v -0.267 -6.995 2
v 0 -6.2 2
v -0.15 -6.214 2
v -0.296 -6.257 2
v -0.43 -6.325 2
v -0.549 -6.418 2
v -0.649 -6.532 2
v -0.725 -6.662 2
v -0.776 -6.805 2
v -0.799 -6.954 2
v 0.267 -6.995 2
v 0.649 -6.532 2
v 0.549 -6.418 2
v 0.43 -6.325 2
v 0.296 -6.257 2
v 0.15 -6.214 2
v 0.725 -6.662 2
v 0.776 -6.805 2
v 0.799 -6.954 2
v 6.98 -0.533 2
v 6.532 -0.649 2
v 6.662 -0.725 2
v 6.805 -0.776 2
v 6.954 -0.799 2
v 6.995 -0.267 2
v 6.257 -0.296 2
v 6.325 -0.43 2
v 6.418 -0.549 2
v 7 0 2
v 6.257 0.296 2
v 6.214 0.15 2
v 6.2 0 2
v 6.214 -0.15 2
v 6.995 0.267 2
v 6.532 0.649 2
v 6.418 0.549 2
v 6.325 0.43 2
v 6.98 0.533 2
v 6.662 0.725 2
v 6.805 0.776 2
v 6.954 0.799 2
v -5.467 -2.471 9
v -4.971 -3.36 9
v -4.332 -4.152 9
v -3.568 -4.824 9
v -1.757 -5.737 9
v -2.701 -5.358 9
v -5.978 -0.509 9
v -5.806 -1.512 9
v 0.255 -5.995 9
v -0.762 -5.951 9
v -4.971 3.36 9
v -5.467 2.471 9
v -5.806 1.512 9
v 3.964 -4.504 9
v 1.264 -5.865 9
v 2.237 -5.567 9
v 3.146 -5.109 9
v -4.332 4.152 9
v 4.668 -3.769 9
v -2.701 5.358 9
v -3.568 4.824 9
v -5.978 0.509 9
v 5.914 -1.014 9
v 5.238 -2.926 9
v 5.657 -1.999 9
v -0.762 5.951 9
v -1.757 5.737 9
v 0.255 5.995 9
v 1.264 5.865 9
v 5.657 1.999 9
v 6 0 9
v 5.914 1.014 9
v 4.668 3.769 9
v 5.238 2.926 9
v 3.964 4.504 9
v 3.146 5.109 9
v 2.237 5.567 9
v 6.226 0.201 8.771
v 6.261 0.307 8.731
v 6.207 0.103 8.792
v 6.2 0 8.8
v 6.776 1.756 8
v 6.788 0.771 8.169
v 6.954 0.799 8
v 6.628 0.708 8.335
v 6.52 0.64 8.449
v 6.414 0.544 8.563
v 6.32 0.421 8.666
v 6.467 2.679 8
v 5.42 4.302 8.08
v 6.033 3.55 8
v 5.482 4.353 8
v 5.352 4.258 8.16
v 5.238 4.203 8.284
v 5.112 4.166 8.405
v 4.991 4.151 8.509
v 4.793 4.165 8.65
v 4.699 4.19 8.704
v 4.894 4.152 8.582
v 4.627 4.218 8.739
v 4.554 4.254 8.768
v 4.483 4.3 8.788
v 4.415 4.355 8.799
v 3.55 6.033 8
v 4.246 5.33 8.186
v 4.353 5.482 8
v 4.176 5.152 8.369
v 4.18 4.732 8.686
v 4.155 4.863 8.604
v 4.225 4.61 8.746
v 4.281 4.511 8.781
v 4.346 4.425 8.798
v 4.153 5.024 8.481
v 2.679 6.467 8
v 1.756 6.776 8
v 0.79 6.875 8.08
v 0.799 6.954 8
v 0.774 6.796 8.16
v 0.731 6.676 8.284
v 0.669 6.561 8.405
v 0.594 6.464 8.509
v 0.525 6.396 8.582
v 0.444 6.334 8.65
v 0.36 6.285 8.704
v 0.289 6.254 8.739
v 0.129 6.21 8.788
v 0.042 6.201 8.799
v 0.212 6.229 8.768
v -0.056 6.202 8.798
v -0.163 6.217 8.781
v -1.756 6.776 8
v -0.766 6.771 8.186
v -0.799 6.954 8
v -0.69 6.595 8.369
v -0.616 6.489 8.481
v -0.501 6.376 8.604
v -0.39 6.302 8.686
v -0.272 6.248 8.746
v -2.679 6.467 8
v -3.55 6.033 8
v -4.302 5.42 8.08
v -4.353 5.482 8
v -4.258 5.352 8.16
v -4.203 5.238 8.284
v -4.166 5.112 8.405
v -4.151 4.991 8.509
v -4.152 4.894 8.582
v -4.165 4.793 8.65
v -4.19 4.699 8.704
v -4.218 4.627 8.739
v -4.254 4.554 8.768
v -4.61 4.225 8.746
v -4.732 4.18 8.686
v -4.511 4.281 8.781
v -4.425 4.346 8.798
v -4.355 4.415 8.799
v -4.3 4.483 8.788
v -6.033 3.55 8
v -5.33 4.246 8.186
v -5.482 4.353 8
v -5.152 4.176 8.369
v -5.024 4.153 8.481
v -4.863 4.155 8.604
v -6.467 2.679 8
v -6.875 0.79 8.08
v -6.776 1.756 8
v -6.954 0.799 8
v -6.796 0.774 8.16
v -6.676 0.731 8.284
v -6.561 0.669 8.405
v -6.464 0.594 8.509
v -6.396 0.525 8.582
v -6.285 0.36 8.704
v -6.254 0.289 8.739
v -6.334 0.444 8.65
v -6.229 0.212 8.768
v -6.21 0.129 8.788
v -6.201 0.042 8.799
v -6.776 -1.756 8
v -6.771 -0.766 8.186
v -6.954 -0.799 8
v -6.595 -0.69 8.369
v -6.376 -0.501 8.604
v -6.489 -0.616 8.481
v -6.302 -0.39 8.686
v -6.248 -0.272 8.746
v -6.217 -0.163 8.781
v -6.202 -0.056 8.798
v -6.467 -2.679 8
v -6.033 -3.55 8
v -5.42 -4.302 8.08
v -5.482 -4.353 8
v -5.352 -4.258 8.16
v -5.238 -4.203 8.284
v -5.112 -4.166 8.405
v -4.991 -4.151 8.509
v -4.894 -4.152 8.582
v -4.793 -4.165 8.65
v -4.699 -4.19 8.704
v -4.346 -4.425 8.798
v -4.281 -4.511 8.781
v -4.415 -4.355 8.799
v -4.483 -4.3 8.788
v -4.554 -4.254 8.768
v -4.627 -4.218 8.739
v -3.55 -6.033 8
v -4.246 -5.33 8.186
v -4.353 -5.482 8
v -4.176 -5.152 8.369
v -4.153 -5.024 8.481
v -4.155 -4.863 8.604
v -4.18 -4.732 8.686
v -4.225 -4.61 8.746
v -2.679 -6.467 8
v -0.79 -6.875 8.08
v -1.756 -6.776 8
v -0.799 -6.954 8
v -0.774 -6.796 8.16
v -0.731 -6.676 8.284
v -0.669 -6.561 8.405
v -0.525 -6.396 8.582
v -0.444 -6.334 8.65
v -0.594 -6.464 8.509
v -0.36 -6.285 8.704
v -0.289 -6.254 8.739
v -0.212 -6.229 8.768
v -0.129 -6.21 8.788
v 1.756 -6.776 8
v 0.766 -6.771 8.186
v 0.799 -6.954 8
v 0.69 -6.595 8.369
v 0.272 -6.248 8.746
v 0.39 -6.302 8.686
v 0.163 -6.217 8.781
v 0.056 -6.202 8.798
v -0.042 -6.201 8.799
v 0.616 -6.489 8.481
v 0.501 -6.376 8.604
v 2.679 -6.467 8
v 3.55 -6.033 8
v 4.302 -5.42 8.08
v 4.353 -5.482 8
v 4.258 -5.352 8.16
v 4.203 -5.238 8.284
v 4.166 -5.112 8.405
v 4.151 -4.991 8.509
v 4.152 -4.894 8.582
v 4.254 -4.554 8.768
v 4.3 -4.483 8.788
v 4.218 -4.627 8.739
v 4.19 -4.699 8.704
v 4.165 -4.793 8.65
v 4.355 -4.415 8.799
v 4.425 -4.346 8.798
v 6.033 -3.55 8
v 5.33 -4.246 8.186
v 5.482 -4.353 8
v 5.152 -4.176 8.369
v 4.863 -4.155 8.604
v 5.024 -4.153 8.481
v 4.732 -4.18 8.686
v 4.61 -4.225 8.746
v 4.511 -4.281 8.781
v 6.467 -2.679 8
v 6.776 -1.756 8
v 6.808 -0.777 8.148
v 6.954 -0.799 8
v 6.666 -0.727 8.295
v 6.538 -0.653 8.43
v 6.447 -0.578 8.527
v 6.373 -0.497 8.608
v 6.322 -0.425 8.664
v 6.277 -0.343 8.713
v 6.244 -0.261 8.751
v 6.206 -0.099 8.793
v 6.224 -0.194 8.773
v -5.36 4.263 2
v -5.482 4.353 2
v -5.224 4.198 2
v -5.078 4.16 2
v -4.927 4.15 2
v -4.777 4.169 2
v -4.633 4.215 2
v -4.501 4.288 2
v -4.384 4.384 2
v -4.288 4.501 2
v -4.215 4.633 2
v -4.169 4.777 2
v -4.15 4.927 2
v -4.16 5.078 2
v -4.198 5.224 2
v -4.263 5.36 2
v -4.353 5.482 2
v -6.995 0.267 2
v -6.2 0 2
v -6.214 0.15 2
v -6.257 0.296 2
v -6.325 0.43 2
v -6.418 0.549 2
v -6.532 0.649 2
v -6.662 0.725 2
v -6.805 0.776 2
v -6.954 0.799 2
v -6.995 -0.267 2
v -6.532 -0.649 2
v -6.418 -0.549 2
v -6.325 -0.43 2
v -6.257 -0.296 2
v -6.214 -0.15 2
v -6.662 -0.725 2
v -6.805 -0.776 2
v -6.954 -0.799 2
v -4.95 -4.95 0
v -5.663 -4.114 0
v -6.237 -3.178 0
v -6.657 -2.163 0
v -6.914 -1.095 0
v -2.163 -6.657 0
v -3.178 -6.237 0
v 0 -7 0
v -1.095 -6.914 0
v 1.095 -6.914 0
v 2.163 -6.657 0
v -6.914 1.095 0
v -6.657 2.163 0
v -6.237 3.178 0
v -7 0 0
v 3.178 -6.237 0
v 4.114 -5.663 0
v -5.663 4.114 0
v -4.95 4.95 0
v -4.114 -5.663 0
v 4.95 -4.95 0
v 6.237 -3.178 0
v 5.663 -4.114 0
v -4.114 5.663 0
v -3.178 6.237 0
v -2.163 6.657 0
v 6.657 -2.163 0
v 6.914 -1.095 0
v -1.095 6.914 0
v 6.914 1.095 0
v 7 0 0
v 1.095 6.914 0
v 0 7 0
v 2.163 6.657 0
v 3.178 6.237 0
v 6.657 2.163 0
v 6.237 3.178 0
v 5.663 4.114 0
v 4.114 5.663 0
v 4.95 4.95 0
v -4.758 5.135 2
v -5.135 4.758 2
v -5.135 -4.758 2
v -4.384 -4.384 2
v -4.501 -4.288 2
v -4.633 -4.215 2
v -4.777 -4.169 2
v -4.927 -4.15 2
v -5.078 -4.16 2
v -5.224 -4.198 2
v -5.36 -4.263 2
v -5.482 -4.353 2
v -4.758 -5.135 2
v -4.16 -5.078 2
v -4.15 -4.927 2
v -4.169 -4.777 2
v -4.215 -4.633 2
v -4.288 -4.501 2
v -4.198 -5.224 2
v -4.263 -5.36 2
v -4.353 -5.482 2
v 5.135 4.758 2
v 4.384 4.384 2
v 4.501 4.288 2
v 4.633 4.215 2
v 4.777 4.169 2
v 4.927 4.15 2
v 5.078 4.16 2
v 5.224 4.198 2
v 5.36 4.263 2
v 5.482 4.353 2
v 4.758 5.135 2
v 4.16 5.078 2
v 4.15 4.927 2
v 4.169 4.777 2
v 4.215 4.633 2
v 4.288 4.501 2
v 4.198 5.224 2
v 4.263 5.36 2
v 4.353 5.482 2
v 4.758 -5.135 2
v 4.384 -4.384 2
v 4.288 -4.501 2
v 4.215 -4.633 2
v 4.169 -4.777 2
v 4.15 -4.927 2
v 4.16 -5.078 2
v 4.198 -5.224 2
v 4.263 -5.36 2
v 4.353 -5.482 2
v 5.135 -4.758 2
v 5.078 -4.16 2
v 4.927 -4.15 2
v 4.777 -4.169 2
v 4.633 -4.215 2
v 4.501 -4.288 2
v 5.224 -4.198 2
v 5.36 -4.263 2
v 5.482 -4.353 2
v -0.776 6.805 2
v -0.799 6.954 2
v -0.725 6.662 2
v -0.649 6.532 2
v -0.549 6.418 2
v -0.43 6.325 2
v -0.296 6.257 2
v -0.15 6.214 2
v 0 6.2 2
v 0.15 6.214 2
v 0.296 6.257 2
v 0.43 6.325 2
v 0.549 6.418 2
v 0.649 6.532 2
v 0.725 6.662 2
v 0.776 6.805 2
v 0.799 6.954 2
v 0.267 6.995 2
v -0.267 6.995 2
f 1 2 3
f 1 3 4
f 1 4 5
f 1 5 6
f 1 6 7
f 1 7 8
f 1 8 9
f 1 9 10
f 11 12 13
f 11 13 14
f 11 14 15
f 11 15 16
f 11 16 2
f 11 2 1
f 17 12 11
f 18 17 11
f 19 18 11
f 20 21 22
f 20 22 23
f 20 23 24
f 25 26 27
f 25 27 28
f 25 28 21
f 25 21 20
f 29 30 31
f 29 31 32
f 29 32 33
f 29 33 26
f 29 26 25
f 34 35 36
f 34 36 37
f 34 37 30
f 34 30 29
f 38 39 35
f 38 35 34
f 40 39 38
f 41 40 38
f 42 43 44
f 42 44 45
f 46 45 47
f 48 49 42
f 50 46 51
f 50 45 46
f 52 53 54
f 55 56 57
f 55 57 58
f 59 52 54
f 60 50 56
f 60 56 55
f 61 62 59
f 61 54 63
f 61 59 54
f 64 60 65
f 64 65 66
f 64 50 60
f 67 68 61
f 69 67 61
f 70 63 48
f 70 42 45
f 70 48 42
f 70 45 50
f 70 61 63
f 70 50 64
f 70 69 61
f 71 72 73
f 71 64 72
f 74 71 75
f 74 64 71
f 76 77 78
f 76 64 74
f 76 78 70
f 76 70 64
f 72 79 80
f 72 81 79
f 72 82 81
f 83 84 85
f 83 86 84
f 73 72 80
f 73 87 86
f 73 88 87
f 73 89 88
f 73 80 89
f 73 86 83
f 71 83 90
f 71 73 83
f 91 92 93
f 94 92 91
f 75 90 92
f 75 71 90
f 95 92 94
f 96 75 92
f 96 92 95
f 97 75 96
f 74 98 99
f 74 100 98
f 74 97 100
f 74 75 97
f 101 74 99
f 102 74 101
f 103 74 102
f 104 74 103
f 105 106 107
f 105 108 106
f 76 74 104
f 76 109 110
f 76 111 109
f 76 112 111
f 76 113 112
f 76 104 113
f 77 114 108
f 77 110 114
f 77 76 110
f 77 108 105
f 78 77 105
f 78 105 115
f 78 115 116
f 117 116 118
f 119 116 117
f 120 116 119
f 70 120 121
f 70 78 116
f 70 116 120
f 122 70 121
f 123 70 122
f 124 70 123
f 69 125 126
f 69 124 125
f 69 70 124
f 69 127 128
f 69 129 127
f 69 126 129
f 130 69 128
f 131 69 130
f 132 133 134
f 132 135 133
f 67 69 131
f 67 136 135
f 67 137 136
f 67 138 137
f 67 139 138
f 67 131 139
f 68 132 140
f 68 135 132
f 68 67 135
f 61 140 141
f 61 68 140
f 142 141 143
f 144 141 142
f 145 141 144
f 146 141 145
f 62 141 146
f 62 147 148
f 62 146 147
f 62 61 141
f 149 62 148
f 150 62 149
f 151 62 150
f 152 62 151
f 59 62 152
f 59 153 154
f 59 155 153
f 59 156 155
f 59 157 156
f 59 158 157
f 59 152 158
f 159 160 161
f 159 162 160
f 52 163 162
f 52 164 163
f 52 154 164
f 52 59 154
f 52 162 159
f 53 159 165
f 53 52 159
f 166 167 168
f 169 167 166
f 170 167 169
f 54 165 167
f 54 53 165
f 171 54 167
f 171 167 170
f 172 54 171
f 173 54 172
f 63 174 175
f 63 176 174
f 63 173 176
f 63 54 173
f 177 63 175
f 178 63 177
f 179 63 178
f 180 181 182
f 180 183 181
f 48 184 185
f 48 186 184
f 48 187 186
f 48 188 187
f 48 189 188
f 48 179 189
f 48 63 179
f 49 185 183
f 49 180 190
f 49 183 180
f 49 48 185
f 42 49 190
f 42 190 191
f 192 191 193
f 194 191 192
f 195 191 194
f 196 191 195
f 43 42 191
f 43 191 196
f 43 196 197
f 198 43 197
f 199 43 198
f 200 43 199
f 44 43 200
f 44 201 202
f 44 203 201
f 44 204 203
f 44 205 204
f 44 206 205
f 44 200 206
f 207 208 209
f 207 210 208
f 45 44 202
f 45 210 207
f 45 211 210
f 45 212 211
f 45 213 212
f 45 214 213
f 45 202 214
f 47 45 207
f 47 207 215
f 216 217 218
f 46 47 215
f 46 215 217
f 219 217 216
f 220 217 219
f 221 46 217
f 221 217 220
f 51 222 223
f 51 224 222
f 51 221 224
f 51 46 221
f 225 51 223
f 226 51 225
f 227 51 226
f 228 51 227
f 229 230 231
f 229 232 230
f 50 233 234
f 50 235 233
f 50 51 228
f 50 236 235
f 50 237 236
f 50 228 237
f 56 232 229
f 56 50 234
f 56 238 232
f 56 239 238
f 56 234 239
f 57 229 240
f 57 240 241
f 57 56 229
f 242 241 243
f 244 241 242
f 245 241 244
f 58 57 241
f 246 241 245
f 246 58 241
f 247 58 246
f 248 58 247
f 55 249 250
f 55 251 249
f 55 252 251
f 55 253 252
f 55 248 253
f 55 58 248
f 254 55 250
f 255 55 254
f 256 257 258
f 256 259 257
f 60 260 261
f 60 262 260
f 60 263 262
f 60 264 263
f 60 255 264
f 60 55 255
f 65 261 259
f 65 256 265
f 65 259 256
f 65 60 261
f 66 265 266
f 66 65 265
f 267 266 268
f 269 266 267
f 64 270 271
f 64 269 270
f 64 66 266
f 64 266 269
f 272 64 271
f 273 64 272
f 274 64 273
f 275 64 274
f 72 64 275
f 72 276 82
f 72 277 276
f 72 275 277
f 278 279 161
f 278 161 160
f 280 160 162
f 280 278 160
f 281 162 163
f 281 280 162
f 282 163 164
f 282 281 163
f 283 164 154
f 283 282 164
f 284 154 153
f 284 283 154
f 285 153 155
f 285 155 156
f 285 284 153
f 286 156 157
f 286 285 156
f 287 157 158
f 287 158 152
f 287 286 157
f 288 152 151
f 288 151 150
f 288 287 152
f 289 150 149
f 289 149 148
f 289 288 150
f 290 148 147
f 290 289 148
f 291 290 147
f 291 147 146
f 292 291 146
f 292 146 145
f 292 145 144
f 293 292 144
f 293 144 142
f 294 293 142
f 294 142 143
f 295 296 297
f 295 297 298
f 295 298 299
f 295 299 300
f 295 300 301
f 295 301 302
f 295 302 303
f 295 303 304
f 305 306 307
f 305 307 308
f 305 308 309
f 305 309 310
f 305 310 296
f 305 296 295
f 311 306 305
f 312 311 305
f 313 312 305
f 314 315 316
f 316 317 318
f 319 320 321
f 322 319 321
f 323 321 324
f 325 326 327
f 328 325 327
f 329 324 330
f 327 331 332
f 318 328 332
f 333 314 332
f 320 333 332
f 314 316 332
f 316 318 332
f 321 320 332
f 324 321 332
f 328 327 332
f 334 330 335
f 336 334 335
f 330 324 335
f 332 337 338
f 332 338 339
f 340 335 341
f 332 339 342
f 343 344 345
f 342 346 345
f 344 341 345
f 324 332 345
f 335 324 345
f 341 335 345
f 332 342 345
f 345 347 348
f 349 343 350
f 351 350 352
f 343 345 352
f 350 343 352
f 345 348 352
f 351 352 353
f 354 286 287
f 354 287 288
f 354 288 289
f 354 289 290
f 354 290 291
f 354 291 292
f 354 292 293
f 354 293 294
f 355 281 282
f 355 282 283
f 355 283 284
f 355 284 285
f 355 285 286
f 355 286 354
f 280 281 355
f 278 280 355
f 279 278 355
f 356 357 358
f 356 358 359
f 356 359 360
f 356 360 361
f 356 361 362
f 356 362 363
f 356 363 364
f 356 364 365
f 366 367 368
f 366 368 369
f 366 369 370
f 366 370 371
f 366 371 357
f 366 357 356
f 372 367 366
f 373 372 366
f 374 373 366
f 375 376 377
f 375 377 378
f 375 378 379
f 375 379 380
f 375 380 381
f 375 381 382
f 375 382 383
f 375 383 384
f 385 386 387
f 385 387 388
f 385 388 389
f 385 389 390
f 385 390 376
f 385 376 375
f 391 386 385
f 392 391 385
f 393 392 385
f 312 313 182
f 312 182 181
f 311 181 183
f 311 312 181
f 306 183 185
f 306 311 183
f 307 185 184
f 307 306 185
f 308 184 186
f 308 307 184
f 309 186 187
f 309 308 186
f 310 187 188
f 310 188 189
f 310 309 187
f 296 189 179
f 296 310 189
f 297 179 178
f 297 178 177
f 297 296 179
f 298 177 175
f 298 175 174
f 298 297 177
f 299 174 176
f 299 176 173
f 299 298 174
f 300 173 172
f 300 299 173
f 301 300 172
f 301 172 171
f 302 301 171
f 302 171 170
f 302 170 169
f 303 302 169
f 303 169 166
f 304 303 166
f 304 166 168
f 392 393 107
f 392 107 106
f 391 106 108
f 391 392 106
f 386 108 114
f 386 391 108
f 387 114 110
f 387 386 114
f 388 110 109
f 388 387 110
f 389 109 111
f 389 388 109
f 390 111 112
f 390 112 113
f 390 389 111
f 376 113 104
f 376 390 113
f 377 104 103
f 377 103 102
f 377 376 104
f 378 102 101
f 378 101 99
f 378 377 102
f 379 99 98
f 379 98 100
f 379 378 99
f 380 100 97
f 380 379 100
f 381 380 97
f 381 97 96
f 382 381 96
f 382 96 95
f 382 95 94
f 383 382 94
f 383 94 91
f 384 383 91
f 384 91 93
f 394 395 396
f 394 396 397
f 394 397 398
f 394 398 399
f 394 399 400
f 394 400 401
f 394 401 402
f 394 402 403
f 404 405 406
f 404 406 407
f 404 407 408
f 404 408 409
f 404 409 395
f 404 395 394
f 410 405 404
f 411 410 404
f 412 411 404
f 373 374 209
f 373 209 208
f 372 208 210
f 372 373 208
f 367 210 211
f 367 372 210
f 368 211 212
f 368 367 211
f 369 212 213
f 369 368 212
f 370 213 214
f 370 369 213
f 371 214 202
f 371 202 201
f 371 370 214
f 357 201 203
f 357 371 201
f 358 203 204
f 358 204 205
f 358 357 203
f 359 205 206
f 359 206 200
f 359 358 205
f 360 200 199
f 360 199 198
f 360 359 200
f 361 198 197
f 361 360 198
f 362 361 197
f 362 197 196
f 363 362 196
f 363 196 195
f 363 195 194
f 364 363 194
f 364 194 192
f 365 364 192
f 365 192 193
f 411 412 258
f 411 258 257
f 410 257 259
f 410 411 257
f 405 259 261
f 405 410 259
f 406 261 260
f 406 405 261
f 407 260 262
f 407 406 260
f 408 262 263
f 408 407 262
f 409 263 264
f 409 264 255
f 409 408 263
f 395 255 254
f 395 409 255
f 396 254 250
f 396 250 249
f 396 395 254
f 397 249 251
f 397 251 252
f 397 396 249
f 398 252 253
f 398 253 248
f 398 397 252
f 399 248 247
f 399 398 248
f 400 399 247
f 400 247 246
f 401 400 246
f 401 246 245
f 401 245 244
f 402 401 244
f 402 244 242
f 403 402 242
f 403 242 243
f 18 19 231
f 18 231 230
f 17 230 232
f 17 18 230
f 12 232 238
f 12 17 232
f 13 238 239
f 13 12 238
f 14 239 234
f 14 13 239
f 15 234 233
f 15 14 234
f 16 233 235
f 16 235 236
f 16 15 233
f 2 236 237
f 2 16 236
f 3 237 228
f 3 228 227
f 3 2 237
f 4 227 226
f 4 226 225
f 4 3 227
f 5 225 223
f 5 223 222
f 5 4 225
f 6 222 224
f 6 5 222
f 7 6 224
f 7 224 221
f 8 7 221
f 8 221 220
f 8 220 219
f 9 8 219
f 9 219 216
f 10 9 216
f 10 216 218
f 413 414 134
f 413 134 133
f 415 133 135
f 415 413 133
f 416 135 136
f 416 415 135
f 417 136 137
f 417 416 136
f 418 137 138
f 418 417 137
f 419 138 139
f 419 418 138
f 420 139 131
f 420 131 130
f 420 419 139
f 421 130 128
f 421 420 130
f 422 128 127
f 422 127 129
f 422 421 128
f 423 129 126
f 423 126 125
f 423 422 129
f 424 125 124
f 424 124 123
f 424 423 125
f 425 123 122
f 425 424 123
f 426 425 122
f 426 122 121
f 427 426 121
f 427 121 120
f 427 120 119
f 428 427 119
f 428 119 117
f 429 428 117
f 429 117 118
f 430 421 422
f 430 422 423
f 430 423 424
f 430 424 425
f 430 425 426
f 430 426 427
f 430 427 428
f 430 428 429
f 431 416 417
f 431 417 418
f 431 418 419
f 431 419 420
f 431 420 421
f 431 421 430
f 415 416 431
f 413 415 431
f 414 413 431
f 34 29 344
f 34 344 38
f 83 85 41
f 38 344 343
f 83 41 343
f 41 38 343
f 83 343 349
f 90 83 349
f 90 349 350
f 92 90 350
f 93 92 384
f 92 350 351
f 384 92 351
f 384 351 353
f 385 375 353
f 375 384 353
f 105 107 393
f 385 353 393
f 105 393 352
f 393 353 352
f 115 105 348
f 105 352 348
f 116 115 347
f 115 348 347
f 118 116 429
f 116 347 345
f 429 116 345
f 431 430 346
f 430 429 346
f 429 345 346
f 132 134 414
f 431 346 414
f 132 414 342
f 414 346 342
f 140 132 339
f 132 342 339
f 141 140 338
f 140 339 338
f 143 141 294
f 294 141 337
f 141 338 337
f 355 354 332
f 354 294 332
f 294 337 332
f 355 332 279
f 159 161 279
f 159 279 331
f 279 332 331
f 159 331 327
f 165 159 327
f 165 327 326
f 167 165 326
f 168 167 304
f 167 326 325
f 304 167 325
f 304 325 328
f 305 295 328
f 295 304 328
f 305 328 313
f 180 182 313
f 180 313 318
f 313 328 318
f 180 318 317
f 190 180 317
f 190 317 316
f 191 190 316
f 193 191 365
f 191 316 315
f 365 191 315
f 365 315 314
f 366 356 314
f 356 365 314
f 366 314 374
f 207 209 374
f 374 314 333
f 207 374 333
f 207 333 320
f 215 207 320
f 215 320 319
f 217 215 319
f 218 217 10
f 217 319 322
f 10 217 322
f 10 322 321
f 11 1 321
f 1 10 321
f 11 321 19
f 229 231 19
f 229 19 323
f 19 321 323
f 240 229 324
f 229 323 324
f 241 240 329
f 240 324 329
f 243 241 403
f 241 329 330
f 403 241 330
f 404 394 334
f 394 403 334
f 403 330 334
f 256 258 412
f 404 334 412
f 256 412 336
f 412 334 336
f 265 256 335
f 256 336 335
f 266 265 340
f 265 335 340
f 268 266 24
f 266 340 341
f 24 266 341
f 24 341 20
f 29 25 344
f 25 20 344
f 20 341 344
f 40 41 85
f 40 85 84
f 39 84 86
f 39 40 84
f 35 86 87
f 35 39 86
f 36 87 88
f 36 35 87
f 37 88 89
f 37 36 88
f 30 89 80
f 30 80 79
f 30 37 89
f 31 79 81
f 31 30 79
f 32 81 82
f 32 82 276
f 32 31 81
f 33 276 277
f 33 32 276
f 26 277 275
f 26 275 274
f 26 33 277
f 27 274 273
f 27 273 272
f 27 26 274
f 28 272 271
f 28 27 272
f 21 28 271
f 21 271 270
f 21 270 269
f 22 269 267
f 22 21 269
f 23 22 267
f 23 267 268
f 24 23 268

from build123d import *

# Parameters (mm, degrees)
CYLINDER001_R     = 0.8
CYLINDER001_DEPTH = 10
ARRAY_COUNT       = 8
CYLINDER_R        = 7
CYLINDER_DEPTH    = 9
CHAMFER_SIZE      = 1


with BuildPart() as array:
    # Cylinder001 → Cylinder001 (new body)
    with BuildSketch(Plane(origin=(7, 0, 0), x_dir=(1, 0, 0), z_dir=(0, 0, 1))):
        Circle(CYLINDER001_R)
    extrude(amount=CYLINDER001_DEPTH)

    # Array: Array ×8 about axis
    array_axis = Axis((0, 0, 0), (0, 0, 1))


with BuildPart() as array_1:
    add(array.part)
    for i in range(1, ARRAY_COUNT):
        add(array.part.rotate(array_axis, i * 360 / ARRAY_COUNT))


with BuildPart() as array_2:
    # Array placement: moved
    add(array_1.part.moved(Location((0, 0, 2))))


with BuildPart() as cut:
    # Cylinder → Cylinder (new body)
    with BuildSketch(Plane.XY):
        Circle(CYLINDER_R)
    extrude(amount=CYLINDER_DEPTH)

    # Chamfer
    chamfer_edges = [cut.edges().sort_by_distance(p)[0] for p in [
        (-7, 0, 9),
    ]]
    chamfer(chamfer_edges, length=CHAMFER_SIZE)

    # Cut: cut Array
    add(array_2.part, mode=Mode.SUBTRACT)


solid = cut.part
